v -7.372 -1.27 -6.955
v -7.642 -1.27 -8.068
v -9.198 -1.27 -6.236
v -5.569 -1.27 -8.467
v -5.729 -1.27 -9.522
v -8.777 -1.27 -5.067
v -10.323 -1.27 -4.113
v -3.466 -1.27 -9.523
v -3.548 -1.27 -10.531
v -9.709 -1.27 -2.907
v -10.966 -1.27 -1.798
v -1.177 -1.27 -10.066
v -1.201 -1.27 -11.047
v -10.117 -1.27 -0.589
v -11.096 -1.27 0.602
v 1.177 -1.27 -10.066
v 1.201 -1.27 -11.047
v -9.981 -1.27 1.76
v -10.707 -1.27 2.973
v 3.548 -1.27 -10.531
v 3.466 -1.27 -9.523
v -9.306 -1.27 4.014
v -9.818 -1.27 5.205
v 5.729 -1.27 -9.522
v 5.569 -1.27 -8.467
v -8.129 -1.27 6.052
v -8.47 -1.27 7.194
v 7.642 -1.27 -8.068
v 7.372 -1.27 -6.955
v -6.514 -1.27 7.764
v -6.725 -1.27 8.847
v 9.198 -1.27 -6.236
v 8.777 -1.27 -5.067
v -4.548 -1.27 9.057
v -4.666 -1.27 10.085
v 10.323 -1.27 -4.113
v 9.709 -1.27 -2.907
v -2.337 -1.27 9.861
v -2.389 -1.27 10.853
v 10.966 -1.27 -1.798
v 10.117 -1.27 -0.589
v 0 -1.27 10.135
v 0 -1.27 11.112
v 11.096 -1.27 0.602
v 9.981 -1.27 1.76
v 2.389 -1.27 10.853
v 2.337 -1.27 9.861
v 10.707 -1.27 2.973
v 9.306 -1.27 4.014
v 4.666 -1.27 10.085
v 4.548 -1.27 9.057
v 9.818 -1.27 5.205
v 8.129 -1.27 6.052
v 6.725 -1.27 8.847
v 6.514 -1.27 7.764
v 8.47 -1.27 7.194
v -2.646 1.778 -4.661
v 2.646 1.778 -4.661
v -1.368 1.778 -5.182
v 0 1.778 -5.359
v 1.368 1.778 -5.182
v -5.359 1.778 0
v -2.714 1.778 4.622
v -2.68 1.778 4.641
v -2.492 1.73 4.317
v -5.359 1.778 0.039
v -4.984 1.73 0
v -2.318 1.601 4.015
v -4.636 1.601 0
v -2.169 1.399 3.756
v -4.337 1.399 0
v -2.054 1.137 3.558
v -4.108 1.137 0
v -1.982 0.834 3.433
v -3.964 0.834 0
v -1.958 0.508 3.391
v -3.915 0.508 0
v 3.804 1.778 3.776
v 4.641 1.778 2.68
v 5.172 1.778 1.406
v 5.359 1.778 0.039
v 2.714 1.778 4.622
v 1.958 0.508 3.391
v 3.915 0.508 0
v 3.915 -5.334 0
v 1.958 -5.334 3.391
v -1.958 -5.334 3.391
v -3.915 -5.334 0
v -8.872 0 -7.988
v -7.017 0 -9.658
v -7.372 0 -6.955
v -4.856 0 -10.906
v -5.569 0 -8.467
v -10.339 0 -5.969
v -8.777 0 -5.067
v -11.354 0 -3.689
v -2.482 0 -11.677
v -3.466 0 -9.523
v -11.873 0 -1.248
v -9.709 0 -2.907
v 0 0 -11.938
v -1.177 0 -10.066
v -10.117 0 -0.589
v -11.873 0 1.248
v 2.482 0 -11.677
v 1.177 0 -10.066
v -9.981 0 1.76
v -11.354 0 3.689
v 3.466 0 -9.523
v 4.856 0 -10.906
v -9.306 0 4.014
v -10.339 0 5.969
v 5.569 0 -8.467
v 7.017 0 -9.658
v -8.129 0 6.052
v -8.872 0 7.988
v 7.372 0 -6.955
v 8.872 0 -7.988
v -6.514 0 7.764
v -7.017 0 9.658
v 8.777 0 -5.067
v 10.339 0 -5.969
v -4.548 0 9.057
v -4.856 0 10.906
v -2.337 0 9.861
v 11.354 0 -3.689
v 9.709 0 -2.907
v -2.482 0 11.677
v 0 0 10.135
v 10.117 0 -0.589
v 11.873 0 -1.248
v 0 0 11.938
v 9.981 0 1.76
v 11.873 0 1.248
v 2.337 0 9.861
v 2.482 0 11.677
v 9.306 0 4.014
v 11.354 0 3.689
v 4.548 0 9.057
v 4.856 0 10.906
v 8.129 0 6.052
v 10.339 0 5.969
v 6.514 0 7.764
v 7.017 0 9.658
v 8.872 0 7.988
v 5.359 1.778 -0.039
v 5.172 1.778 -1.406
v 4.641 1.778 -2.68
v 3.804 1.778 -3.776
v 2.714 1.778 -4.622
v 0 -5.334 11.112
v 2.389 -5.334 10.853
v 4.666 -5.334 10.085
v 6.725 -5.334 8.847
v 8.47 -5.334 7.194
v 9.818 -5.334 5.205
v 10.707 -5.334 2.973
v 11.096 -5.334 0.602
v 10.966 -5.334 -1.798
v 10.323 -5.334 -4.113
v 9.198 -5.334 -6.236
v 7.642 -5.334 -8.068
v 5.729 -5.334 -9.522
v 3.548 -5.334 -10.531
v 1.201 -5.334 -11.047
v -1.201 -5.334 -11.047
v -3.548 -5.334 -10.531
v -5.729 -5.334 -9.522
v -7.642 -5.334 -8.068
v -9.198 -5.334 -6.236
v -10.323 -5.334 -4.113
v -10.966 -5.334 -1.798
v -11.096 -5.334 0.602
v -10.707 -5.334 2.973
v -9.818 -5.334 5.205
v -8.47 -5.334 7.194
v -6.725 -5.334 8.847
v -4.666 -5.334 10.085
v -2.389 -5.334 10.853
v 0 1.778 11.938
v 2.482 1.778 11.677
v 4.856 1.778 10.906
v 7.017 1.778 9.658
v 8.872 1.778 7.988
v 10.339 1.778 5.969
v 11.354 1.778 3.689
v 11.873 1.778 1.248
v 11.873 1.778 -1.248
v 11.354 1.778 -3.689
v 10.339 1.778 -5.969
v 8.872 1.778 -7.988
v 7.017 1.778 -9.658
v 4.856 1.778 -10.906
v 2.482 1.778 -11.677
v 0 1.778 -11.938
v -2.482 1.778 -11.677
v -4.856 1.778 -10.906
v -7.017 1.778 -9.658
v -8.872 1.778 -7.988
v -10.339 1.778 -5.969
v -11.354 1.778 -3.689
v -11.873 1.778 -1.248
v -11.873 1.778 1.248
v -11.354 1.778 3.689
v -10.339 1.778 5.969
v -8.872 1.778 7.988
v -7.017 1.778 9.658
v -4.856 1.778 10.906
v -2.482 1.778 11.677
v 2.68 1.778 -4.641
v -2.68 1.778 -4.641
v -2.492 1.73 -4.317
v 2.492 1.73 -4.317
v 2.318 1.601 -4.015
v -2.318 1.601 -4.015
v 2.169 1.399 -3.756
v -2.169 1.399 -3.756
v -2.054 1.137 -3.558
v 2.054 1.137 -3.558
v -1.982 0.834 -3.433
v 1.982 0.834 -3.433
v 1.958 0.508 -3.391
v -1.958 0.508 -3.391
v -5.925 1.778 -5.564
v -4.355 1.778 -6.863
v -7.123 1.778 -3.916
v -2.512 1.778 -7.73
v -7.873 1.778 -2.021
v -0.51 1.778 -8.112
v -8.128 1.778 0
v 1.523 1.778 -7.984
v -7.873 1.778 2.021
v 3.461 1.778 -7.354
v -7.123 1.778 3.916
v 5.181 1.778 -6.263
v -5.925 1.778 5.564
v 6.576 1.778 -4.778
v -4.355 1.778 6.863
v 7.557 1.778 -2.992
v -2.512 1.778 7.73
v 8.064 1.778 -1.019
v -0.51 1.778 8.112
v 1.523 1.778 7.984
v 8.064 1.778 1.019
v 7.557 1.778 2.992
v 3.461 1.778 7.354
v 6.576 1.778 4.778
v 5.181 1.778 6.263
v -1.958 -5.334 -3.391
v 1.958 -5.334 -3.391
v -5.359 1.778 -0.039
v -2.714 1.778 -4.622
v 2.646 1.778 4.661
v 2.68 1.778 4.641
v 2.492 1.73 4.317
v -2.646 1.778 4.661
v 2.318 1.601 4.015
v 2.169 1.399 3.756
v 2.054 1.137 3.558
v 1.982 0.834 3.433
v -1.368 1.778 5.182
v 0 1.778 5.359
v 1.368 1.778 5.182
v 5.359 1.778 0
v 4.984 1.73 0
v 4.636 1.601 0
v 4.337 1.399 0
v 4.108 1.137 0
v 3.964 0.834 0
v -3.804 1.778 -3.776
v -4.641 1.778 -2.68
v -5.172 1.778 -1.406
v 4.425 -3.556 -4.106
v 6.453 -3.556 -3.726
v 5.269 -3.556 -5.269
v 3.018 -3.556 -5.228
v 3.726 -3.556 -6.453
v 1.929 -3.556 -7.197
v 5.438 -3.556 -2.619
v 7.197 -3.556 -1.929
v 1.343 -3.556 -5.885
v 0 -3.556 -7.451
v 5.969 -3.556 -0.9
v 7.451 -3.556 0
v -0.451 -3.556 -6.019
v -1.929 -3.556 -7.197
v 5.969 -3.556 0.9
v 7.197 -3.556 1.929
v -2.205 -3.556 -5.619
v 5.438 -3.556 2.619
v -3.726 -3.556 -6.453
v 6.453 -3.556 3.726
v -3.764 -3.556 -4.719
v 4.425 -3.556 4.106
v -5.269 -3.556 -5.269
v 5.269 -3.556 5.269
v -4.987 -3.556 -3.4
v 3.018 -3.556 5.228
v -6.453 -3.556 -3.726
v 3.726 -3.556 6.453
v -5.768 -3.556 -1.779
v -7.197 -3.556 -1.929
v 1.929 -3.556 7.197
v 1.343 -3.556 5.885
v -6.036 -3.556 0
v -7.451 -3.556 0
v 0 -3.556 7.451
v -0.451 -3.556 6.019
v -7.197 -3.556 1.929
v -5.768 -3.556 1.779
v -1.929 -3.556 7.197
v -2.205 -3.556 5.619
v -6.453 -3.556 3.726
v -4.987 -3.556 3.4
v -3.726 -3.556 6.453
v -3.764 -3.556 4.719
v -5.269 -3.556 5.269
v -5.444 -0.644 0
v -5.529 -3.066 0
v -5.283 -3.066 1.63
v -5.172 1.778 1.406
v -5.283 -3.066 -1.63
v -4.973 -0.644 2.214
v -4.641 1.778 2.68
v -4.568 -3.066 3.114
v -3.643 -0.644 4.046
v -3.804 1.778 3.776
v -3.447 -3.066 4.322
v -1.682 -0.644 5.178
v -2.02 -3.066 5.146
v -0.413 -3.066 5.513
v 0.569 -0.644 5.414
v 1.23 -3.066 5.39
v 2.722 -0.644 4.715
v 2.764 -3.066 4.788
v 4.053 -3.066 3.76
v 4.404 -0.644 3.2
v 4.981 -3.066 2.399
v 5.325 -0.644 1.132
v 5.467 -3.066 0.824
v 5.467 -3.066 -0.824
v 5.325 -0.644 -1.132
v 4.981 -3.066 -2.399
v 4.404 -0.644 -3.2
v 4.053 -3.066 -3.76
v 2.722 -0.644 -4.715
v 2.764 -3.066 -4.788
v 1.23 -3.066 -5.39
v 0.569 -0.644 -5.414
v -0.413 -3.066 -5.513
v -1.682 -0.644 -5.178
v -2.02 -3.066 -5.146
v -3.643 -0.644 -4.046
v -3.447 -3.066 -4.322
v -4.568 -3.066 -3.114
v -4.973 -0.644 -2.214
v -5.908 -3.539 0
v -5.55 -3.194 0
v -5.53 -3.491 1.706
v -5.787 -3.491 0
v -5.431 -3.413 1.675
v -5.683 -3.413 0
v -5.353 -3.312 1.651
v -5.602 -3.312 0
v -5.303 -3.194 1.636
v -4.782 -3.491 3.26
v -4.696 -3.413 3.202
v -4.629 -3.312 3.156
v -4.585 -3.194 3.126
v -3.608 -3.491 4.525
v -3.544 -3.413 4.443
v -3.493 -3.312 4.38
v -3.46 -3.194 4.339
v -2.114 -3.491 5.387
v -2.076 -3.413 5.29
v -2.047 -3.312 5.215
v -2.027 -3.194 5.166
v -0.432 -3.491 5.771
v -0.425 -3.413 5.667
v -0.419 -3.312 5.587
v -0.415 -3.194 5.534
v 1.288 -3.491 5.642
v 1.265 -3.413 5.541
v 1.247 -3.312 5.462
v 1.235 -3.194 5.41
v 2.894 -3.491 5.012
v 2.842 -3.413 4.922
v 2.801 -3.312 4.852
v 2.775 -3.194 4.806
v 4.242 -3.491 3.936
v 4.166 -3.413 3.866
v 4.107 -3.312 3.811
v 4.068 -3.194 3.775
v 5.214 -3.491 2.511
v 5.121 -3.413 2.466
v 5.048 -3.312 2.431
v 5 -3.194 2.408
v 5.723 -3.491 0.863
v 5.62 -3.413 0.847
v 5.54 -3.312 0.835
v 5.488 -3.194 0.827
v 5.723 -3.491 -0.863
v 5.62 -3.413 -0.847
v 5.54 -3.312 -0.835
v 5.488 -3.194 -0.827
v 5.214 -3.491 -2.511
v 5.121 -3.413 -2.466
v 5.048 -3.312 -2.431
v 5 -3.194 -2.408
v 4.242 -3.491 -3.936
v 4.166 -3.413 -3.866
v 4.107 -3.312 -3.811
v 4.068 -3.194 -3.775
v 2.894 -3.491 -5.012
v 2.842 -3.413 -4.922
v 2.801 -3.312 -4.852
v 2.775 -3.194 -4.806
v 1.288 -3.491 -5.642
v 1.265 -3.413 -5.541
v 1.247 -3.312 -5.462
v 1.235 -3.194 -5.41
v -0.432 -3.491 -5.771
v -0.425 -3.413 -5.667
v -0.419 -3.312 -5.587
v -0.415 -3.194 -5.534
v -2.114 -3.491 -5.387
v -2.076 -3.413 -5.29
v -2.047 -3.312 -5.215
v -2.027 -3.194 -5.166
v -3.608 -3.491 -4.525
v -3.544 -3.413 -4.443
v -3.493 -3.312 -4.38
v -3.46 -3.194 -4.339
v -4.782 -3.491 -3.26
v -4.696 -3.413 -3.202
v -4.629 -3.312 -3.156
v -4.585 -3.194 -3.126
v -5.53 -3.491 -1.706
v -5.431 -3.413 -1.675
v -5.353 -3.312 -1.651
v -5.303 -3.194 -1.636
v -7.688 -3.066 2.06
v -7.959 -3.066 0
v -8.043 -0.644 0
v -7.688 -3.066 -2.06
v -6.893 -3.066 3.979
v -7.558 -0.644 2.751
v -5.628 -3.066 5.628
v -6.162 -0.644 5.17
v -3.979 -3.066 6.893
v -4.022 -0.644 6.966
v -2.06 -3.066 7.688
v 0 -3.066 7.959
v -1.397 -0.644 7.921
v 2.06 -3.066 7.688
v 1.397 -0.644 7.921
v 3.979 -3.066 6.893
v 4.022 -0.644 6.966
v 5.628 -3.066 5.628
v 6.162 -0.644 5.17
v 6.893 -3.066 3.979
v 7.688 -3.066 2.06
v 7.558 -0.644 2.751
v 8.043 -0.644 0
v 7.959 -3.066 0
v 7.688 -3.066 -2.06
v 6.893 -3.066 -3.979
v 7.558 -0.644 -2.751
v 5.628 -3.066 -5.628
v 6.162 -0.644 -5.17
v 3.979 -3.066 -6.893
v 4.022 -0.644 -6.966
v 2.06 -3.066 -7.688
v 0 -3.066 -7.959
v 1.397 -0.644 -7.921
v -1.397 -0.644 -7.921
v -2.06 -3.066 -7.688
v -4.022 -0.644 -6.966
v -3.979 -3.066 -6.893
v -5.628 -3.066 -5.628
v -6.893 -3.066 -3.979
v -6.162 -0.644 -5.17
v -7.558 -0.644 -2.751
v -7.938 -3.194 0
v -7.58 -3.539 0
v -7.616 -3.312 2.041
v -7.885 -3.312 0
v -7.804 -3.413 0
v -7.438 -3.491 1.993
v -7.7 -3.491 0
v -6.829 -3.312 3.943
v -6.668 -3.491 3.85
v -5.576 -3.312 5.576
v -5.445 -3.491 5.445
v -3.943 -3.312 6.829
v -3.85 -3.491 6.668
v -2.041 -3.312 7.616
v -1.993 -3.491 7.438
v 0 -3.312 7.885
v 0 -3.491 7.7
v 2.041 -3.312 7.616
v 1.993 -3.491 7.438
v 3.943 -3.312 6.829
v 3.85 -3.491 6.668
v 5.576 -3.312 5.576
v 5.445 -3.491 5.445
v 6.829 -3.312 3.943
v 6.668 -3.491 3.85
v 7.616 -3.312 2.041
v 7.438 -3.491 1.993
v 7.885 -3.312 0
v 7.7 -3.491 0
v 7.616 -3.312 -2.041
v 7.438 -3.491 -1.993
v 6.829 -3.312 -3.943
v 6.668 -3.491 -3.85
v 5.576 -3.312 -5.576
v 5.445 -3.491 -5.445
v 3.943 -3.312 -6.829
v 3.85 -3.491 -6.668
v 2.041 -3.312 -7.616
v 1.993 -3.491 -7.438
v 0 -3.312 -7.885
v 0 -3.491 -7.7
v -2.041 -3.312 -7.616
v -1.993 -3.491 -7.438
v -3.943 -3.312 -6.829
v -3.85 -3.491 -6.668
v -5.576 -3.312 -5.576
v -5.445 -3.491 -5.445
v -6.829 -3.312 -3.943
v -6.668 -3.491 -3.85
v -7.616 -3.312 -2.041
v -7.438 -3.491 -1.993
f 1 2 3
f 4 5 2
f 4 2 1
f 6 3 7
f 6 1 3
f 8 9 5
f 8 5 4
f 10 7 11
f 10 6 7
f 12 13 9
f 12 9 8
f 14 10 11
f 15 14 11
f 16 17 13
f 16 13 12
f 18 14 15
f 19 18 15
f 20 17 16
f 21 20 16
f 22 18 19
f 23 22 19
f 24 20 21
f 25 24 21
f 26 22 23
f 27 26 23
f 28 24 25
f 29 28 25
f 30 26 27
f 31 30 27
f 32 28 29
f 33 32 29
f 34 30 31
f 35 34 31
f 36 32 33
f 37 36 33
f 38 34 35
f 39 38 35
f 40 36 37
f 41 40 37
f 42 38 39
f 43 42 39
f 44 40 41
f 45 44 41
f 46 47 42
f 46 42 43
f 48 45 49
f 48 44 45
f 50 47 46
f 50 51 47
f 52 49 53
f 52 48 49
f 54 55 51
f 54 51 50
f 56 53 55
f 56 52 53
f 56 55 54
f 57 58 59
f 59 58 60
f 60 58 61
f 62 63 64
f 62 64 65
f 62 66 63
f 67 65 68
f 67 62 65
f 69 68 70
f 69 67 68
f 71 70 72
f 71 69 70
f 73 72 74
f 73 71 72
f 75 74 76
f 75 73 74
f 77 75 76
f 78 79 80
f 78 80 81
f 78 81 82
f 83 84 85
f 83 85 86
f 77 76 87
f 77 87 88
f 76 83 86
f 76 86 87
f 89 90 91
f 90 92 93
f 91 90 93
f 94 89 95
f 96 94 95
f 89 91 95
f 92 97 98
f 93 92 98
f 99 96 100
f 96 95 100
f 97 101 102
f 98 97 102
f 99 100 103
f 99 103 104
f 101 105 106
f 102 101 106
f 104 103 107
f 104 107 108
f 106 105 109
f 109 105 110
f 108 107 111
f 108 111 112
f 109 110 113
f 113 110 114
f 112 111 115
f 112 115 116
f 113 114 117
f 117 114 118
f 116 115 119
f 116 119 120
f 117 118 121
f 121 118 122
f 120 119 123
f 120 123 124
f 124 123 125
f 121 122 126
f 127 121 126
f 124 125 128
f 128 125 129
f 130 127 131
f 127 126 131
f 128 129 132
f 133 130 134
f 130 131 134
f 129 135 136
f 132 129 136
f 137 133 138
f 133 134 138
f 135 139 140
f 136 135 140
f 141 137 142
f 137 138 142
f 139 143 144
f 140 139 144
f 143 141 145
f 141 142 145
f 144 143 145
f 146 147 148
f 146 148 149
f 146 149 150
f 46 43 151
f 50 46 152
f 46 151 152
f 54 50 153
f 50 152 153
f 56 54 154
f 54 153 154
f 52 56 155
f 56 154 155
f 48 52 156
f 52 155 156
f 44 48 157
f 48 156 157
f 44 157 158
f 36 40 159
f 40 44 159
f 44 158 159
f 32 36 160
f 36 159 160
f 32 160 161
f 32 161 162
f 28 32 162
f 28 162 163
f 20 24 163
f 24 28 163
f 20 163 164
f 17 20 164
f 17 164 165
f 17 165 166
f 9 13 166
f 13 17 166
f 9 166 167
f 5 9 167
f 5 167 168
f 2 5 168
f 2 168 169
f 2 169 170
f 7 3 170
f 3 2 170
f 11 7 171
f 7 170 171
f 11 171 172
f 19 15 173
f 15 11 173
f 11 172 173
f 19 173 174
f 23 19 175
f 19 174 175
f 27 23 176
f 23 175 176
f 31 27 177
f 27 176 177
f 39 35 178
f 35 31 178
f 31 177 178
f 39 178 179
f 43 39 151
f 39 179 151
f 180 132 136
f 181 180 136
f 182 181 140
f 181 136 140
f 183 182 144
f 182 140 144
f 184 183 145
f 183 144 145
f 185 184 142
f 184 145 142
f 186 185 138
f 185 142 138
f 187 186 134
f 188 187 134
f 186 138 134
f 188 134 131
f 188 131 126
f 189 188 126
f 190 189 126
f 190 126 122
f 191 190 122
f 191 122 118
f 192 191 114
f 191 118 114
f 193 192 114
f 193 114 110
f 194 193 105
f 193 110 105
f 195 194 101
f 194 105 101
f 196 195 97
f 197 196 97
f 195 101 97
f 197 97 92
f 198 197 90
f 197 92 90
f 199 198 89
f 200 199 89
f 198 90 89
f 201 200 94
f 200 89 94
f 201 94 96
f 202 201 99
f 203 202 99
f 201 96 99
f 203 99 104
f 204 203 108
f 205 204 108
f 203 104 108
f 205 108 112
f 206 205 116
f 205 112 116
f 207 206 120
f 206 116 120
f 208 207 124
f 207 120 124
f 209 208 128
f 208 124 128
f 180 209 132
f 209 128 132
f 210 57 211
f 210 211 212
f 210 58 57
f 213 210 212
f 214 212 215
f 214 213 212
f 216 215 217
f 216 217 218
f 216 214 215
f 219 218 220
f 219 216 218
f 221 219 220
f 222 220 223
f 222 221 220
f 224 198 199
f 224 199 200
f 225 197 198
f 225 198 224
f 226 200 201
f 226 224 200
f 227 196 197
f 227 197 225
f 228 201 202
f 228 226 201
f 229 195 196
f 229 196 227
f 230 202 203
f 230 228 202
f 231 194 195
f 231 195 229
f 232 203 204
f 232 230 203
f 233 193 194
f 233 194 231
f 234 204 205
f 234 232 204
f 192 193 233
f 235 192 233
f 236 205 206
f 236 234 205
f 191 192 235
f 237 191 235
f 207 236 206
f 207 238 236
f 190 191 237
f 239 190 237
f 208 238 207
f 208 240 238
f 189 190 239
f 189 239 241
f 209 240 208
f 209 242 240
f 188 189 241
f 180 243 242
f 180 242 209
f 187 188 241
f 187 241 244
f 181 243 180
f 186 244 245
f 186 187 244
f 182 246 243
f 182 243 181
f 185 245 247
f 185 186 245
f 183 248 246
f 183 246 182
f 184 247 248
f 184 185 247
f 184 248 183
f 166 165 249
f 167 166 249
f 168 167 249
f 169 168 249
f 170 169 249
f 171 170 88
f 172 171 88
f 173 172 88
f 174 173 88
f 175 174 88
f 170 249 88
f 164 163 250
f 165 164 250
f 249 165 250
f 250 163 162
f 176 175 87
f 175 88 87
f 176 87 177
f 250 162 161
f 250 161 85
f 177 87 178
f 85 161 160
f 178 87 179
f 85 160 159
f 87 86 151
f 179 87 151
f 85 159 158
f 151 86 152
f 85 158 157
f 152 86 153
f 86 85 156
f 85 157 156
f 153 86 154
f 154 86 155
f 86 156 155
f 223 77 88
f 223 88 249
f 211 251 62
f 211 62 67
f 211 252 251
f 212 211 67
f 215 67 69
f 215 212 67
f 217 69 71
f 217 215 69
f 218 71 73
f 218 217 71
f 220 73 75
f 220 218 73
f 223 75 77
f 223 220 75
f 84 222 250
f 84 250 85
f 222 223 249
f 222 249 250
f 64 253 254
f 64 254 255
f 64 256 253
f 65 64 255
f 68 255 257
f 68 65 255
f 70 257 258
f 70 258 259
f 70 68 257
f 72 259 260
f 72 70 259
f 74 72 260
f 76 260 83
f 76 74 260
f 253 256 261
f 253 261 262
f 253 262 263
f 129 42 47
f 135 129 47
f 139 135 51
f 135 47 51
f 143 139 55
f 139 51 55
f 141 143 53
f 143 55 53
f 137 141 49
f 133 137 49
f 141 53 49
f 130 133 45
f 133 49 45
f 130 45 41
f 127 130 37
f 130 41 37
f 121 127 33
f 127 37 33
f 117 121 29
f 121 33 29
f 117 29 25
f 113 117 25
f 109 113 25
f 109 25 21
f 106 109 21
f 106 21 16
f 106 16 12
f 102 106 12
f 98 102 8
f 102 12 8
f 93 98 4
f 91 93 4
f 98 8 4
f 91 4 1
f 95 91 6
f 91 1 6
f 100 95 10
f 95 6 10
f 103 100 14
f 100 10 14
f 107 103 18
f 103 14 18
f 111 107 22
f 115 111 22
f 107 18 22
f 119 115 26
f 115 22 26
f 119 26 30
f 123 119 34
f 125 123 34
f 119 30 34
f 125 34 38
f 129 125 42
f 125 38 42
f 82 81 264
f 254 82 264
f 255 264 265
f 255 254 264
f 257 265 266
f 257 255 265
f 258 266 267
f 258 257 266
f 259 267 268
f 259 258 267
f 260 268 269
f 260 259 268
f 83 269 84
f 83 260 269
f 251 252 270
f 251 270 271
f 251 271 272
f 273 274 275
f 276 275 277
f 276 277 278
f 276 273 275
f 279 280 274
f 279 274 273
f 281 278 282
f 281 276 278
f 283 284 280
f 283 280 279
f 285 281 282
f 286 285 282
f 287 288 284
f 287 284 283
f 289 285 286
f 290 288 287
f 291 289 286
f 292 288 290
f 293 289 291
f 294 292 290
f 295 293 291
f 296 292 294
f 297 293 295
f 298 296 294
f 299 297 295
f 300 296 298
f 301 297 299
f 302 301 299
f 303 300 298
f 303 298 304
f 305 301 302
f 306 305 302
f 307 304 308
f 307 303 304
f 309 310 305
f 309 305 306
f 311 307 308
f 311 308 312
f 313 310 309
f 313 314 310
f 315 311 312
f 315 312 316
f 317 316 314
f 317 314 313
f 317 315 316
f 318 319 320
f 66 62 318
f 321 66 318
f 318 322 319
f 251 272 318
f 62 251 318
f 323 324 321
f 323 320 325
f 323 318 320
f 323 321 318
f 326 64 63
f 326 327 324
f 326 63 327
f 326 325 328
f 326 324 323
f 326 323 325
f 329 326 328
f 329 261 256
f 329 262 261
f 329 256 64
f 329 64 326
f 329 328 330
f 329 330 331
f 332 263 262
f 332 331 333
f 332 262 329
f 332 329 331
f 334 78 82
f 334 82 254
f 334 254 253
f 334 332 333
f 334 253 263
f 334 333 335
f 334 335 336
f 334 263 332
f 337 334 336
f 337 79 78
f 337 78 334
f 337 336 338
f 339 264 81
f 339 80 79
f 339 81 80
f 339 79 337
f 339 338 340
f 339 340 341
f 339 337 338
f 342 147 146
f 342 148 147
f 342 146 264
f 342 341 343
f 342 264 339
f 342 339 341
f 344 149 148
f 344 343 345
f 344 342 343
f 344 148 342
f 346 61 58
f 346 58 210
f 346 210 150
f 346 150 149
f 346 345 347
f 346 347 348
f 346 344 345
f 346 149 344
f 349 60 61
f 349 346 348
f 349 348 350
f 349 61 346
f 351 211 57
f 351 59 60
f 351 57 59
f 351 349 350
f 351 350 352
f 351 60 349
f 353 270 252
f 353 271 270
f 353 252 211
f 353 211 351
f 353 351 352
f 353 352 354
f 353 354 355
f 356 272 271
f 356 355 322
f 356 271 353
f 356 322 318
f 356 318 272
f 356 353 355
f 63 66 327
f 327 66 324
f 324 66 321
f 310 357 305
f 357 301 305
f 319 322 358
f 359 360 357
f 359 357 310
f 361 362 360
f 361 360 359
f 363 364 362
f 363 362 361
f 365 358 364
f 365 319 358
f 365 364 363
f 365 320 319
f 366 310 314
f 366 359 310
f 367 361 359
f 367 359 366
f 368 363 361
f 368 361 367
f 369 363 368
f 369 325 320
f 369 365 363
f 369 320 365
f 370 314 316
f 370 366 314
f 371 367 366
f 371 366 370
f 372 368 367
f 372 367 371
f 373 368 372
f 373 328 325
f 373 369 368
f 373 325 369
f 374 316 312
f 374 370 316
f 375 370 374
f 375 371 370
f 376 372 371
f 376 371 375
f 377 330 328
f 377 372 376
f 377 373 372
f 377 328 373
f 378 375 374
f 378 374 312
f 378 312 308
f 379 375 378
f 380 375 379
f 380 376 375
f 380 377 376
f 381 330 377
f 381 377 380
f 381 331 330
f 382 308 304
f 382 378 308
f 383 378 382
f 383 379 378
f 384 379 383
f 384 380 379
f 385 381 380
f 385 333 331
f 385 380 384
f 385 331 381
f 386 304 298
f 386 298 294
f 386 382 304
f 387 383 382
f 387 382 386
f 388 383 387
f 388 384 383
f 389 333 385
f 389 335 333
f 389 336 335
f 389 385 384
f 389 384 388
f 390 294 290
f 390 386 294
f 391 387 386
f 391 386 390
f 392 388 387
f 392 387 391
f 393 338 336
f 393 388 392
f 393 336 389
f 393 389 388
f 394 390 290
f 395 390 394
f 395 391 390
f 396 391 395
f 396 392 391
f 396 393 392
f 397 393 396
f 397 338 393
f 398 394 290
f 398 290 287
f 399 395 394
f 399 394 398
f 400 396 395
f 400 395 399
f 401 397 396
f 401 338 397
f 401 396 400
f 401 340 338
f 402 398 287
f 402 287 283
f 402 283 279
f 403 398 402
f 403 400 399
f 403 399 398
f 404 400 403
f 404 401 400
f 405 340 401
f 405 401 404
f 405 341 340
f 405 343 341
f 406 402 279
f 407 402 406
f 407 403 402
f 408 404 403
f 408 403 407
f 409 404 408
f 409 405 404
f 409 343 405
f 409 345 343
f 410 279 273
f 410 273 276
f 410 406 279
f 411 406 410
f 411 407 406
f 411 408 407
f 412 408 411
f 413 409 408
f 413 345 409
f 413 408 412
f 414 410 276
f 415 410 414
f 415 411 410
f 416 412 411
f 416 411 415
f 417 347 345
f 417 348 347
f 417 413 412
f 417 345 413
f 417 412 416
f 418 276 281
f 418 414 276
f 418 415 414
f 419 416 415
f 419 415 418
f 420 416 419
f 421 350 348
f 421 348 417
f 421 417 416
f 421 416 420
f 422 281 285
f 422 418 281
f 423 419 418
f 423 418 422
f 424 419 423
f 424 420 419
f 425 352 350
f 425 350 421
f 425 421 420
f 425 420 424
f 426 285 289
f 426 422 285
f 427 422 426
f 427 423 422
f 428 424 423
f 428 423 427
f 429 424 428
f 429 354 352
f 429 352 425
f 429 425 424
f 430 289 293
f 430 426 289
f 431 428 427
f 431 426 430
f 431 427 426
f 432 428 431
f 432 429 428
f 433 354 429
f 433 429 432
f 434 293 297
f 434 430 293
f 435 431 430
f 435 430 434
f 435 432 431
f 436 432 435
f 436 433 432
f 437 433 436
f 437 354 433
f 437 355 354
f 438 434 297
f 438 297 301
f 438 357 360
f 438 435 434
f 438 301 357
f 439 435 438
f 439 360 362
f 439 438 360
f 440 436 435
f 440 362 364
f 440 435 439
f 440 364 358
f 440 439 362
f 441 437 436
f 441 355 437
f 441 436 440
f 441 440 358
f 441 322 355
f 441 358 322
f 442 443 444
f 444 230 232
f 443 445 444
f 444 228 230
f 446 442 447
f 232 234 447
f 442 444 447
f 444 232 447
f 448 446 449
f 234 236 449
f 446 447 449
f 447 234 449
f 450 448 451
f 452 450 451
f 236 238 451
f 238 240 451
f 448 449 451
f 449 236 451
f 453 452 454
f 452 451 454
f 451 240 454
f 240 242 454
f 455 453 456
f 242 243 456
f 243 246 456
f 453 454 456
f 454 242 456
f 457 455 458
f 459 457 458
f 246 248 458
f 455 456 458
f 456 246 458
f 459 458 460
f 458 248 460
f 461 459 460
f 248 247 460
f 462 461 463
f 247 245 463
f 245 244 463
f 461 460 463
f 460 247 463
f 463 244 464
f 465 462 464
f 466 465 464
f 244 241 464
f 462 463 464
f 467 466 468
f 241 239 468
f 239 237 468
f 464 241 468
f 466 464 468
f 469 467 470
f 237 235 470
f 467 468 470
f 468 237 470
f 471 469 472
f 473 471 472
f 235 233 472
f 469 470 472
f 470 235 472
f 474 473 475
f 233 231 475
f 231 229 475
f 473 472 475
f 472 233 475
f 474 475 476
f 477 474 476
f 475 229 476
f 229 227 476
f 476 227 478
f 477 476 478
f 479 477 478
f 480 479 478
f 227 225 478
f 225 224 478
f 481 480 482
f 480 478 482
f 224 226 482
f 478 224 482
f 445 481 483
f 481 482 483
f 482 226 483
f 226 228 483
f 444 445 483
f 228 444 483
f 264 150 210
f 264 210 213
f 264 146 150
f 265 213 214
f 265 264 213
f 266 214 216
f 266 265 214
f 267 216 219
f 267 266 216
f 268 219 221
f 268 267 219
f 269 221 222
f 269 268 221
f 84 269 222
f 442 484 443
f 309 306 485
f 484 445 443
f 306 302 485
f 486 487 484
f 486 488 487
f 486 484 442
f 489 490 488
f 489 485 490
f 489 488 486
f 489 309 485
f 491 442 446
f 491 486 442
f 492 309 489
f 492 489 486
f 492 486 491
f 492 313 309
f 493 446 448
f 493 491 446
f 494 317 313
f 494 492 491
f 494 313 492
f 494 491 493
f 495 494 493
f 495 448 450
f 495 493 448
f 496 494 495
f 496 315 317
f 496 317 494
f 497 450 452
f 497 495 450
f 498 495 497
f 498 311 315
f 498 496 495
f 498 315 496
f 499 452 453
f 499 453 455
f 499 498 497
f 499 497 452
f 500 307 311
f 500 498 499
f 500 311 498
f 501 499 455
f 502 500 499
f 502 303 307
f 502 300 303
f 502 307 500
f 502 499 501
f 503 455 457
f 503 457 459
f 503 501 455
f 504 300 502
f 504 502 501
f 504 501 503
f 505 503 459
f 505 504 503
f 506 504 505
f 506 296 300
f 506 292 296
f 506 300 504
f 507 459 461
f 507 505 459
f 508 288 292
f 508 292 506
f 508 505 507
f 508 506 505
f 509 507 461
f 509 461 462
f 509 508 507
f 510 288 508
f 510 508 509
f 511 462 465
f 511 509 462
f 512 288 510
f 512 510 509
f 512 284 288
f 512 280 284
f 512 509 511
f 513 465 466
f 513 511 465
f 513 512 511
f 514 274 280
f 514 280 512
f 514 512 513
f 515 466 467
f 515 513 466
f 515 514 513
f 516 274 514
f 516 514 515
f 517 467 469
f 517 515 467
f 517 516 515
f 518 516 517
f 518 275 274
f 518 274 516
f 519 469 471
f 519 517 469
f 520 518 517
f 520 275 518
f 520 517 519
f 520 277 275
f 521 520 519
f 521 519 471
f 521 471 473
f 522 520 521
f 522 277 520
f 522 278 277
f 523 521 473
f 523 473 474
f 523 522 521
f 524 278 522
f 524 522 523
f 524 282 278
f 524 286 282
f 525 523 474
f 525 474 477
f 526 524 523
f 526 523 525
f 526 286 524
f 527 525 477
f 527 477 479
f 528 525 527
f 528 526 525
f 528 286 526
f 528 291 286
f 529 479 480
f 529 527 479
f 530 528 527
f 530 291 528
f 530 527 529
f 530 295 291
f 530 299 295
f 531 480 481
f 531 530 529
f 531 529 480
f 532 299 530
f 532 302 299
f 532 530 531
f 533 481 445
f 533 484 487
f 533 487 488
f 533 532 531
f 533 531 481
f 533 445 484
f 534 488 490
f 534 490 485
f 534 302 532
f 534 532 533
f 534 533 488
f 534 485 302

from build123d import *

# Parameters (mm, degrees)
BLANK_BEFORE_THREAD_DEPTH      = 1.778
BLANK_BEFORE_THREAD_DEPTH_BACK = 5.334
SKETCH1_R                      = 11.1125
SKETCH4_R                      = 11.938
HEAD_DEPTH                     = 1.778
RECESS_START                   = -1.27
SKETCH5_R                      = 11.938
SKETCH5_R_2                    = 10.1346
RECESS_UNDER_HEAD_DEPTH        = 1.27
FILL_START                     = 1.27
SKETCH8_R                      = 10.1346
FILL_IN_RECESS_DEPTH           = 1.27
HEX_THRU_DEPTH                 = 19.319722487
FILLET_ON_HEX_R                = 1.27
SKETCH7_R                      = 8.128
SKETCH7_R_2                    = 5.3594
SPRING_RECESS_DEPTH            = 5.334
SPRING_RECESS_DRAFT            = -2
FILLET1_R                      = 0.508


with BuildPart() as part:
    # Sketch1 → Blank Before Thread (new, two sides: drawn at the far end of the back side and taken through both)
    with BuildSketch(Plane(origin=(0, 0, 0), x_dir=(1, 0, 0), z_dir=(0, 1, 0)).offset(-BLANK_BEFORE_THREAD_DEPTH_BACK)):
        with Locations(Location((0, 0, 0), (0, 0, 270))):
            Circle(SKETCH1_R)
    extrude(amount=BLANK_BEFORE_THREAD_DEPTH + BLANK_BEFORE_THREAD_DEPTH_BACK)

    # Sketch4 → Head (add)
    with BuildSketch(Plane(origin=(0, 0, 0), x_dir=(1, 0, 0), z_dir=(0, 1, 0))):
        with Locations(Location((0, 0, 0), (0, 0, 270))):
            Circle(SKETCH4_R)
    extrude(amount=HEAD_DEPTH)

    # Sketch5 → Recess Under Head (cut)
    with BuildSketch(Plane(origin=(0, 0, 0), x_dir=(1, 0, 0), z_dir=(0, 1, 0)).offset(RECESS_START)):
        with Locations(Location((0, 0, 0), (0, 0, 270))):
            Circle(SKETCH5_R)
        with Locations(Location((0, 0, 0), (0, 0, 270))):
            Circle(SKETCH5_R_2, mode=Mode.SUBTRACT)
    extrude(amount=RECESS_UNDER_HEAD_DEPTH, mode=Mode.SUBTRACT)

    # Sketch8 → Fill in Recess (add)
    with BuildSketch(Plane.XZ.offset(FILL_START)):
        with Locations(Location((0, 0, 0), (0, 0, 90))):
            Circle(SKETCH8_R)
    extrude(amount=-FILL_IN_RECESS_DEPTH)

    # Sketch6 → Hex Thru (cut, through all)
    with BuildSketch(Plane(origin=(0, 1.778, 0), x_dir=(-1, 0, 0), z_dir=(0, 1, 0))):
        Polygon((1.957737028, -3.3909), (-1.957737028, -3.3909), (-3.915474056, 0), (-1.957737028, 3.3909), (1.957737028, 3.3909), (3.915474056, 0), align=None)
    extrude(amount=-HEX_THRU_DEPTH, mode=Mode.SUBTRACT)

    # Fillet on Hex
    fillet_on_hex_edges = [part.edges().sort_by_distance(p)[0] for p in [
        (2.936605542, 1.778, -1.69545),
        (-2.936605542, 1.778, 1.69545),
        (0, 1.778, -3.3909),
        (-2.936605542, 1.778, -1.69545),
        (0, 1.778, 3.3909),
        (2.936605542, 1.778, 1.69545),
    ]]
    fillet(fillet_on_hex_edges, radius=FILLET_ON_HEX_R)


with BuildPart() as spring_recess_tool:
    # Sketch7 → Spring Recess (with draft: the straight prism first)
    with BuildSketch(Plane(origin=(0, 1.778, 0), x_dir=(-1, 0, 0), z_dir=(0, 1, 0))):
        Circle(SKETCH7_R)
        Circle(SKETCH7_R_2, mode=Mode.SUBTRACT)
    extrude(amount=-SPRING_RECESS_DEPTH)
    # Spring Recess: the draft: its side faces are tilted about the plane it starts from
    spring_recess_sides = [spring_recess_tool.faces().sort_by_distance(p)[0] for p in [
        (8.128, -0.889, 0),
        (5.3594, -0.889, 0),
    ]]
    draft(spring_recess_sides, Plane(origin=(0, 1.778, 0), x_dir=(-1, 0, 0), z_dir=(0, 1, 0)), SPRING_RECESS_DRAFT)


with BuildPart() as part_1:
    add(part.part)

    # Spring Recess: cut by spring_recess_tool
    add(spring_recess_tool.part, mode=Mode.SUBTRACT)

    # Fillet1
    fillet1_edges = [part_1.edges().sort_by_distance(p)[0] for p in [
        (7.941732616, -3.556, 0),
        (5.545667384, -3.556, 0),
    ]]
    fillet(fillet1_edges, radius=FILLET1_R)


solid = part_1.part
